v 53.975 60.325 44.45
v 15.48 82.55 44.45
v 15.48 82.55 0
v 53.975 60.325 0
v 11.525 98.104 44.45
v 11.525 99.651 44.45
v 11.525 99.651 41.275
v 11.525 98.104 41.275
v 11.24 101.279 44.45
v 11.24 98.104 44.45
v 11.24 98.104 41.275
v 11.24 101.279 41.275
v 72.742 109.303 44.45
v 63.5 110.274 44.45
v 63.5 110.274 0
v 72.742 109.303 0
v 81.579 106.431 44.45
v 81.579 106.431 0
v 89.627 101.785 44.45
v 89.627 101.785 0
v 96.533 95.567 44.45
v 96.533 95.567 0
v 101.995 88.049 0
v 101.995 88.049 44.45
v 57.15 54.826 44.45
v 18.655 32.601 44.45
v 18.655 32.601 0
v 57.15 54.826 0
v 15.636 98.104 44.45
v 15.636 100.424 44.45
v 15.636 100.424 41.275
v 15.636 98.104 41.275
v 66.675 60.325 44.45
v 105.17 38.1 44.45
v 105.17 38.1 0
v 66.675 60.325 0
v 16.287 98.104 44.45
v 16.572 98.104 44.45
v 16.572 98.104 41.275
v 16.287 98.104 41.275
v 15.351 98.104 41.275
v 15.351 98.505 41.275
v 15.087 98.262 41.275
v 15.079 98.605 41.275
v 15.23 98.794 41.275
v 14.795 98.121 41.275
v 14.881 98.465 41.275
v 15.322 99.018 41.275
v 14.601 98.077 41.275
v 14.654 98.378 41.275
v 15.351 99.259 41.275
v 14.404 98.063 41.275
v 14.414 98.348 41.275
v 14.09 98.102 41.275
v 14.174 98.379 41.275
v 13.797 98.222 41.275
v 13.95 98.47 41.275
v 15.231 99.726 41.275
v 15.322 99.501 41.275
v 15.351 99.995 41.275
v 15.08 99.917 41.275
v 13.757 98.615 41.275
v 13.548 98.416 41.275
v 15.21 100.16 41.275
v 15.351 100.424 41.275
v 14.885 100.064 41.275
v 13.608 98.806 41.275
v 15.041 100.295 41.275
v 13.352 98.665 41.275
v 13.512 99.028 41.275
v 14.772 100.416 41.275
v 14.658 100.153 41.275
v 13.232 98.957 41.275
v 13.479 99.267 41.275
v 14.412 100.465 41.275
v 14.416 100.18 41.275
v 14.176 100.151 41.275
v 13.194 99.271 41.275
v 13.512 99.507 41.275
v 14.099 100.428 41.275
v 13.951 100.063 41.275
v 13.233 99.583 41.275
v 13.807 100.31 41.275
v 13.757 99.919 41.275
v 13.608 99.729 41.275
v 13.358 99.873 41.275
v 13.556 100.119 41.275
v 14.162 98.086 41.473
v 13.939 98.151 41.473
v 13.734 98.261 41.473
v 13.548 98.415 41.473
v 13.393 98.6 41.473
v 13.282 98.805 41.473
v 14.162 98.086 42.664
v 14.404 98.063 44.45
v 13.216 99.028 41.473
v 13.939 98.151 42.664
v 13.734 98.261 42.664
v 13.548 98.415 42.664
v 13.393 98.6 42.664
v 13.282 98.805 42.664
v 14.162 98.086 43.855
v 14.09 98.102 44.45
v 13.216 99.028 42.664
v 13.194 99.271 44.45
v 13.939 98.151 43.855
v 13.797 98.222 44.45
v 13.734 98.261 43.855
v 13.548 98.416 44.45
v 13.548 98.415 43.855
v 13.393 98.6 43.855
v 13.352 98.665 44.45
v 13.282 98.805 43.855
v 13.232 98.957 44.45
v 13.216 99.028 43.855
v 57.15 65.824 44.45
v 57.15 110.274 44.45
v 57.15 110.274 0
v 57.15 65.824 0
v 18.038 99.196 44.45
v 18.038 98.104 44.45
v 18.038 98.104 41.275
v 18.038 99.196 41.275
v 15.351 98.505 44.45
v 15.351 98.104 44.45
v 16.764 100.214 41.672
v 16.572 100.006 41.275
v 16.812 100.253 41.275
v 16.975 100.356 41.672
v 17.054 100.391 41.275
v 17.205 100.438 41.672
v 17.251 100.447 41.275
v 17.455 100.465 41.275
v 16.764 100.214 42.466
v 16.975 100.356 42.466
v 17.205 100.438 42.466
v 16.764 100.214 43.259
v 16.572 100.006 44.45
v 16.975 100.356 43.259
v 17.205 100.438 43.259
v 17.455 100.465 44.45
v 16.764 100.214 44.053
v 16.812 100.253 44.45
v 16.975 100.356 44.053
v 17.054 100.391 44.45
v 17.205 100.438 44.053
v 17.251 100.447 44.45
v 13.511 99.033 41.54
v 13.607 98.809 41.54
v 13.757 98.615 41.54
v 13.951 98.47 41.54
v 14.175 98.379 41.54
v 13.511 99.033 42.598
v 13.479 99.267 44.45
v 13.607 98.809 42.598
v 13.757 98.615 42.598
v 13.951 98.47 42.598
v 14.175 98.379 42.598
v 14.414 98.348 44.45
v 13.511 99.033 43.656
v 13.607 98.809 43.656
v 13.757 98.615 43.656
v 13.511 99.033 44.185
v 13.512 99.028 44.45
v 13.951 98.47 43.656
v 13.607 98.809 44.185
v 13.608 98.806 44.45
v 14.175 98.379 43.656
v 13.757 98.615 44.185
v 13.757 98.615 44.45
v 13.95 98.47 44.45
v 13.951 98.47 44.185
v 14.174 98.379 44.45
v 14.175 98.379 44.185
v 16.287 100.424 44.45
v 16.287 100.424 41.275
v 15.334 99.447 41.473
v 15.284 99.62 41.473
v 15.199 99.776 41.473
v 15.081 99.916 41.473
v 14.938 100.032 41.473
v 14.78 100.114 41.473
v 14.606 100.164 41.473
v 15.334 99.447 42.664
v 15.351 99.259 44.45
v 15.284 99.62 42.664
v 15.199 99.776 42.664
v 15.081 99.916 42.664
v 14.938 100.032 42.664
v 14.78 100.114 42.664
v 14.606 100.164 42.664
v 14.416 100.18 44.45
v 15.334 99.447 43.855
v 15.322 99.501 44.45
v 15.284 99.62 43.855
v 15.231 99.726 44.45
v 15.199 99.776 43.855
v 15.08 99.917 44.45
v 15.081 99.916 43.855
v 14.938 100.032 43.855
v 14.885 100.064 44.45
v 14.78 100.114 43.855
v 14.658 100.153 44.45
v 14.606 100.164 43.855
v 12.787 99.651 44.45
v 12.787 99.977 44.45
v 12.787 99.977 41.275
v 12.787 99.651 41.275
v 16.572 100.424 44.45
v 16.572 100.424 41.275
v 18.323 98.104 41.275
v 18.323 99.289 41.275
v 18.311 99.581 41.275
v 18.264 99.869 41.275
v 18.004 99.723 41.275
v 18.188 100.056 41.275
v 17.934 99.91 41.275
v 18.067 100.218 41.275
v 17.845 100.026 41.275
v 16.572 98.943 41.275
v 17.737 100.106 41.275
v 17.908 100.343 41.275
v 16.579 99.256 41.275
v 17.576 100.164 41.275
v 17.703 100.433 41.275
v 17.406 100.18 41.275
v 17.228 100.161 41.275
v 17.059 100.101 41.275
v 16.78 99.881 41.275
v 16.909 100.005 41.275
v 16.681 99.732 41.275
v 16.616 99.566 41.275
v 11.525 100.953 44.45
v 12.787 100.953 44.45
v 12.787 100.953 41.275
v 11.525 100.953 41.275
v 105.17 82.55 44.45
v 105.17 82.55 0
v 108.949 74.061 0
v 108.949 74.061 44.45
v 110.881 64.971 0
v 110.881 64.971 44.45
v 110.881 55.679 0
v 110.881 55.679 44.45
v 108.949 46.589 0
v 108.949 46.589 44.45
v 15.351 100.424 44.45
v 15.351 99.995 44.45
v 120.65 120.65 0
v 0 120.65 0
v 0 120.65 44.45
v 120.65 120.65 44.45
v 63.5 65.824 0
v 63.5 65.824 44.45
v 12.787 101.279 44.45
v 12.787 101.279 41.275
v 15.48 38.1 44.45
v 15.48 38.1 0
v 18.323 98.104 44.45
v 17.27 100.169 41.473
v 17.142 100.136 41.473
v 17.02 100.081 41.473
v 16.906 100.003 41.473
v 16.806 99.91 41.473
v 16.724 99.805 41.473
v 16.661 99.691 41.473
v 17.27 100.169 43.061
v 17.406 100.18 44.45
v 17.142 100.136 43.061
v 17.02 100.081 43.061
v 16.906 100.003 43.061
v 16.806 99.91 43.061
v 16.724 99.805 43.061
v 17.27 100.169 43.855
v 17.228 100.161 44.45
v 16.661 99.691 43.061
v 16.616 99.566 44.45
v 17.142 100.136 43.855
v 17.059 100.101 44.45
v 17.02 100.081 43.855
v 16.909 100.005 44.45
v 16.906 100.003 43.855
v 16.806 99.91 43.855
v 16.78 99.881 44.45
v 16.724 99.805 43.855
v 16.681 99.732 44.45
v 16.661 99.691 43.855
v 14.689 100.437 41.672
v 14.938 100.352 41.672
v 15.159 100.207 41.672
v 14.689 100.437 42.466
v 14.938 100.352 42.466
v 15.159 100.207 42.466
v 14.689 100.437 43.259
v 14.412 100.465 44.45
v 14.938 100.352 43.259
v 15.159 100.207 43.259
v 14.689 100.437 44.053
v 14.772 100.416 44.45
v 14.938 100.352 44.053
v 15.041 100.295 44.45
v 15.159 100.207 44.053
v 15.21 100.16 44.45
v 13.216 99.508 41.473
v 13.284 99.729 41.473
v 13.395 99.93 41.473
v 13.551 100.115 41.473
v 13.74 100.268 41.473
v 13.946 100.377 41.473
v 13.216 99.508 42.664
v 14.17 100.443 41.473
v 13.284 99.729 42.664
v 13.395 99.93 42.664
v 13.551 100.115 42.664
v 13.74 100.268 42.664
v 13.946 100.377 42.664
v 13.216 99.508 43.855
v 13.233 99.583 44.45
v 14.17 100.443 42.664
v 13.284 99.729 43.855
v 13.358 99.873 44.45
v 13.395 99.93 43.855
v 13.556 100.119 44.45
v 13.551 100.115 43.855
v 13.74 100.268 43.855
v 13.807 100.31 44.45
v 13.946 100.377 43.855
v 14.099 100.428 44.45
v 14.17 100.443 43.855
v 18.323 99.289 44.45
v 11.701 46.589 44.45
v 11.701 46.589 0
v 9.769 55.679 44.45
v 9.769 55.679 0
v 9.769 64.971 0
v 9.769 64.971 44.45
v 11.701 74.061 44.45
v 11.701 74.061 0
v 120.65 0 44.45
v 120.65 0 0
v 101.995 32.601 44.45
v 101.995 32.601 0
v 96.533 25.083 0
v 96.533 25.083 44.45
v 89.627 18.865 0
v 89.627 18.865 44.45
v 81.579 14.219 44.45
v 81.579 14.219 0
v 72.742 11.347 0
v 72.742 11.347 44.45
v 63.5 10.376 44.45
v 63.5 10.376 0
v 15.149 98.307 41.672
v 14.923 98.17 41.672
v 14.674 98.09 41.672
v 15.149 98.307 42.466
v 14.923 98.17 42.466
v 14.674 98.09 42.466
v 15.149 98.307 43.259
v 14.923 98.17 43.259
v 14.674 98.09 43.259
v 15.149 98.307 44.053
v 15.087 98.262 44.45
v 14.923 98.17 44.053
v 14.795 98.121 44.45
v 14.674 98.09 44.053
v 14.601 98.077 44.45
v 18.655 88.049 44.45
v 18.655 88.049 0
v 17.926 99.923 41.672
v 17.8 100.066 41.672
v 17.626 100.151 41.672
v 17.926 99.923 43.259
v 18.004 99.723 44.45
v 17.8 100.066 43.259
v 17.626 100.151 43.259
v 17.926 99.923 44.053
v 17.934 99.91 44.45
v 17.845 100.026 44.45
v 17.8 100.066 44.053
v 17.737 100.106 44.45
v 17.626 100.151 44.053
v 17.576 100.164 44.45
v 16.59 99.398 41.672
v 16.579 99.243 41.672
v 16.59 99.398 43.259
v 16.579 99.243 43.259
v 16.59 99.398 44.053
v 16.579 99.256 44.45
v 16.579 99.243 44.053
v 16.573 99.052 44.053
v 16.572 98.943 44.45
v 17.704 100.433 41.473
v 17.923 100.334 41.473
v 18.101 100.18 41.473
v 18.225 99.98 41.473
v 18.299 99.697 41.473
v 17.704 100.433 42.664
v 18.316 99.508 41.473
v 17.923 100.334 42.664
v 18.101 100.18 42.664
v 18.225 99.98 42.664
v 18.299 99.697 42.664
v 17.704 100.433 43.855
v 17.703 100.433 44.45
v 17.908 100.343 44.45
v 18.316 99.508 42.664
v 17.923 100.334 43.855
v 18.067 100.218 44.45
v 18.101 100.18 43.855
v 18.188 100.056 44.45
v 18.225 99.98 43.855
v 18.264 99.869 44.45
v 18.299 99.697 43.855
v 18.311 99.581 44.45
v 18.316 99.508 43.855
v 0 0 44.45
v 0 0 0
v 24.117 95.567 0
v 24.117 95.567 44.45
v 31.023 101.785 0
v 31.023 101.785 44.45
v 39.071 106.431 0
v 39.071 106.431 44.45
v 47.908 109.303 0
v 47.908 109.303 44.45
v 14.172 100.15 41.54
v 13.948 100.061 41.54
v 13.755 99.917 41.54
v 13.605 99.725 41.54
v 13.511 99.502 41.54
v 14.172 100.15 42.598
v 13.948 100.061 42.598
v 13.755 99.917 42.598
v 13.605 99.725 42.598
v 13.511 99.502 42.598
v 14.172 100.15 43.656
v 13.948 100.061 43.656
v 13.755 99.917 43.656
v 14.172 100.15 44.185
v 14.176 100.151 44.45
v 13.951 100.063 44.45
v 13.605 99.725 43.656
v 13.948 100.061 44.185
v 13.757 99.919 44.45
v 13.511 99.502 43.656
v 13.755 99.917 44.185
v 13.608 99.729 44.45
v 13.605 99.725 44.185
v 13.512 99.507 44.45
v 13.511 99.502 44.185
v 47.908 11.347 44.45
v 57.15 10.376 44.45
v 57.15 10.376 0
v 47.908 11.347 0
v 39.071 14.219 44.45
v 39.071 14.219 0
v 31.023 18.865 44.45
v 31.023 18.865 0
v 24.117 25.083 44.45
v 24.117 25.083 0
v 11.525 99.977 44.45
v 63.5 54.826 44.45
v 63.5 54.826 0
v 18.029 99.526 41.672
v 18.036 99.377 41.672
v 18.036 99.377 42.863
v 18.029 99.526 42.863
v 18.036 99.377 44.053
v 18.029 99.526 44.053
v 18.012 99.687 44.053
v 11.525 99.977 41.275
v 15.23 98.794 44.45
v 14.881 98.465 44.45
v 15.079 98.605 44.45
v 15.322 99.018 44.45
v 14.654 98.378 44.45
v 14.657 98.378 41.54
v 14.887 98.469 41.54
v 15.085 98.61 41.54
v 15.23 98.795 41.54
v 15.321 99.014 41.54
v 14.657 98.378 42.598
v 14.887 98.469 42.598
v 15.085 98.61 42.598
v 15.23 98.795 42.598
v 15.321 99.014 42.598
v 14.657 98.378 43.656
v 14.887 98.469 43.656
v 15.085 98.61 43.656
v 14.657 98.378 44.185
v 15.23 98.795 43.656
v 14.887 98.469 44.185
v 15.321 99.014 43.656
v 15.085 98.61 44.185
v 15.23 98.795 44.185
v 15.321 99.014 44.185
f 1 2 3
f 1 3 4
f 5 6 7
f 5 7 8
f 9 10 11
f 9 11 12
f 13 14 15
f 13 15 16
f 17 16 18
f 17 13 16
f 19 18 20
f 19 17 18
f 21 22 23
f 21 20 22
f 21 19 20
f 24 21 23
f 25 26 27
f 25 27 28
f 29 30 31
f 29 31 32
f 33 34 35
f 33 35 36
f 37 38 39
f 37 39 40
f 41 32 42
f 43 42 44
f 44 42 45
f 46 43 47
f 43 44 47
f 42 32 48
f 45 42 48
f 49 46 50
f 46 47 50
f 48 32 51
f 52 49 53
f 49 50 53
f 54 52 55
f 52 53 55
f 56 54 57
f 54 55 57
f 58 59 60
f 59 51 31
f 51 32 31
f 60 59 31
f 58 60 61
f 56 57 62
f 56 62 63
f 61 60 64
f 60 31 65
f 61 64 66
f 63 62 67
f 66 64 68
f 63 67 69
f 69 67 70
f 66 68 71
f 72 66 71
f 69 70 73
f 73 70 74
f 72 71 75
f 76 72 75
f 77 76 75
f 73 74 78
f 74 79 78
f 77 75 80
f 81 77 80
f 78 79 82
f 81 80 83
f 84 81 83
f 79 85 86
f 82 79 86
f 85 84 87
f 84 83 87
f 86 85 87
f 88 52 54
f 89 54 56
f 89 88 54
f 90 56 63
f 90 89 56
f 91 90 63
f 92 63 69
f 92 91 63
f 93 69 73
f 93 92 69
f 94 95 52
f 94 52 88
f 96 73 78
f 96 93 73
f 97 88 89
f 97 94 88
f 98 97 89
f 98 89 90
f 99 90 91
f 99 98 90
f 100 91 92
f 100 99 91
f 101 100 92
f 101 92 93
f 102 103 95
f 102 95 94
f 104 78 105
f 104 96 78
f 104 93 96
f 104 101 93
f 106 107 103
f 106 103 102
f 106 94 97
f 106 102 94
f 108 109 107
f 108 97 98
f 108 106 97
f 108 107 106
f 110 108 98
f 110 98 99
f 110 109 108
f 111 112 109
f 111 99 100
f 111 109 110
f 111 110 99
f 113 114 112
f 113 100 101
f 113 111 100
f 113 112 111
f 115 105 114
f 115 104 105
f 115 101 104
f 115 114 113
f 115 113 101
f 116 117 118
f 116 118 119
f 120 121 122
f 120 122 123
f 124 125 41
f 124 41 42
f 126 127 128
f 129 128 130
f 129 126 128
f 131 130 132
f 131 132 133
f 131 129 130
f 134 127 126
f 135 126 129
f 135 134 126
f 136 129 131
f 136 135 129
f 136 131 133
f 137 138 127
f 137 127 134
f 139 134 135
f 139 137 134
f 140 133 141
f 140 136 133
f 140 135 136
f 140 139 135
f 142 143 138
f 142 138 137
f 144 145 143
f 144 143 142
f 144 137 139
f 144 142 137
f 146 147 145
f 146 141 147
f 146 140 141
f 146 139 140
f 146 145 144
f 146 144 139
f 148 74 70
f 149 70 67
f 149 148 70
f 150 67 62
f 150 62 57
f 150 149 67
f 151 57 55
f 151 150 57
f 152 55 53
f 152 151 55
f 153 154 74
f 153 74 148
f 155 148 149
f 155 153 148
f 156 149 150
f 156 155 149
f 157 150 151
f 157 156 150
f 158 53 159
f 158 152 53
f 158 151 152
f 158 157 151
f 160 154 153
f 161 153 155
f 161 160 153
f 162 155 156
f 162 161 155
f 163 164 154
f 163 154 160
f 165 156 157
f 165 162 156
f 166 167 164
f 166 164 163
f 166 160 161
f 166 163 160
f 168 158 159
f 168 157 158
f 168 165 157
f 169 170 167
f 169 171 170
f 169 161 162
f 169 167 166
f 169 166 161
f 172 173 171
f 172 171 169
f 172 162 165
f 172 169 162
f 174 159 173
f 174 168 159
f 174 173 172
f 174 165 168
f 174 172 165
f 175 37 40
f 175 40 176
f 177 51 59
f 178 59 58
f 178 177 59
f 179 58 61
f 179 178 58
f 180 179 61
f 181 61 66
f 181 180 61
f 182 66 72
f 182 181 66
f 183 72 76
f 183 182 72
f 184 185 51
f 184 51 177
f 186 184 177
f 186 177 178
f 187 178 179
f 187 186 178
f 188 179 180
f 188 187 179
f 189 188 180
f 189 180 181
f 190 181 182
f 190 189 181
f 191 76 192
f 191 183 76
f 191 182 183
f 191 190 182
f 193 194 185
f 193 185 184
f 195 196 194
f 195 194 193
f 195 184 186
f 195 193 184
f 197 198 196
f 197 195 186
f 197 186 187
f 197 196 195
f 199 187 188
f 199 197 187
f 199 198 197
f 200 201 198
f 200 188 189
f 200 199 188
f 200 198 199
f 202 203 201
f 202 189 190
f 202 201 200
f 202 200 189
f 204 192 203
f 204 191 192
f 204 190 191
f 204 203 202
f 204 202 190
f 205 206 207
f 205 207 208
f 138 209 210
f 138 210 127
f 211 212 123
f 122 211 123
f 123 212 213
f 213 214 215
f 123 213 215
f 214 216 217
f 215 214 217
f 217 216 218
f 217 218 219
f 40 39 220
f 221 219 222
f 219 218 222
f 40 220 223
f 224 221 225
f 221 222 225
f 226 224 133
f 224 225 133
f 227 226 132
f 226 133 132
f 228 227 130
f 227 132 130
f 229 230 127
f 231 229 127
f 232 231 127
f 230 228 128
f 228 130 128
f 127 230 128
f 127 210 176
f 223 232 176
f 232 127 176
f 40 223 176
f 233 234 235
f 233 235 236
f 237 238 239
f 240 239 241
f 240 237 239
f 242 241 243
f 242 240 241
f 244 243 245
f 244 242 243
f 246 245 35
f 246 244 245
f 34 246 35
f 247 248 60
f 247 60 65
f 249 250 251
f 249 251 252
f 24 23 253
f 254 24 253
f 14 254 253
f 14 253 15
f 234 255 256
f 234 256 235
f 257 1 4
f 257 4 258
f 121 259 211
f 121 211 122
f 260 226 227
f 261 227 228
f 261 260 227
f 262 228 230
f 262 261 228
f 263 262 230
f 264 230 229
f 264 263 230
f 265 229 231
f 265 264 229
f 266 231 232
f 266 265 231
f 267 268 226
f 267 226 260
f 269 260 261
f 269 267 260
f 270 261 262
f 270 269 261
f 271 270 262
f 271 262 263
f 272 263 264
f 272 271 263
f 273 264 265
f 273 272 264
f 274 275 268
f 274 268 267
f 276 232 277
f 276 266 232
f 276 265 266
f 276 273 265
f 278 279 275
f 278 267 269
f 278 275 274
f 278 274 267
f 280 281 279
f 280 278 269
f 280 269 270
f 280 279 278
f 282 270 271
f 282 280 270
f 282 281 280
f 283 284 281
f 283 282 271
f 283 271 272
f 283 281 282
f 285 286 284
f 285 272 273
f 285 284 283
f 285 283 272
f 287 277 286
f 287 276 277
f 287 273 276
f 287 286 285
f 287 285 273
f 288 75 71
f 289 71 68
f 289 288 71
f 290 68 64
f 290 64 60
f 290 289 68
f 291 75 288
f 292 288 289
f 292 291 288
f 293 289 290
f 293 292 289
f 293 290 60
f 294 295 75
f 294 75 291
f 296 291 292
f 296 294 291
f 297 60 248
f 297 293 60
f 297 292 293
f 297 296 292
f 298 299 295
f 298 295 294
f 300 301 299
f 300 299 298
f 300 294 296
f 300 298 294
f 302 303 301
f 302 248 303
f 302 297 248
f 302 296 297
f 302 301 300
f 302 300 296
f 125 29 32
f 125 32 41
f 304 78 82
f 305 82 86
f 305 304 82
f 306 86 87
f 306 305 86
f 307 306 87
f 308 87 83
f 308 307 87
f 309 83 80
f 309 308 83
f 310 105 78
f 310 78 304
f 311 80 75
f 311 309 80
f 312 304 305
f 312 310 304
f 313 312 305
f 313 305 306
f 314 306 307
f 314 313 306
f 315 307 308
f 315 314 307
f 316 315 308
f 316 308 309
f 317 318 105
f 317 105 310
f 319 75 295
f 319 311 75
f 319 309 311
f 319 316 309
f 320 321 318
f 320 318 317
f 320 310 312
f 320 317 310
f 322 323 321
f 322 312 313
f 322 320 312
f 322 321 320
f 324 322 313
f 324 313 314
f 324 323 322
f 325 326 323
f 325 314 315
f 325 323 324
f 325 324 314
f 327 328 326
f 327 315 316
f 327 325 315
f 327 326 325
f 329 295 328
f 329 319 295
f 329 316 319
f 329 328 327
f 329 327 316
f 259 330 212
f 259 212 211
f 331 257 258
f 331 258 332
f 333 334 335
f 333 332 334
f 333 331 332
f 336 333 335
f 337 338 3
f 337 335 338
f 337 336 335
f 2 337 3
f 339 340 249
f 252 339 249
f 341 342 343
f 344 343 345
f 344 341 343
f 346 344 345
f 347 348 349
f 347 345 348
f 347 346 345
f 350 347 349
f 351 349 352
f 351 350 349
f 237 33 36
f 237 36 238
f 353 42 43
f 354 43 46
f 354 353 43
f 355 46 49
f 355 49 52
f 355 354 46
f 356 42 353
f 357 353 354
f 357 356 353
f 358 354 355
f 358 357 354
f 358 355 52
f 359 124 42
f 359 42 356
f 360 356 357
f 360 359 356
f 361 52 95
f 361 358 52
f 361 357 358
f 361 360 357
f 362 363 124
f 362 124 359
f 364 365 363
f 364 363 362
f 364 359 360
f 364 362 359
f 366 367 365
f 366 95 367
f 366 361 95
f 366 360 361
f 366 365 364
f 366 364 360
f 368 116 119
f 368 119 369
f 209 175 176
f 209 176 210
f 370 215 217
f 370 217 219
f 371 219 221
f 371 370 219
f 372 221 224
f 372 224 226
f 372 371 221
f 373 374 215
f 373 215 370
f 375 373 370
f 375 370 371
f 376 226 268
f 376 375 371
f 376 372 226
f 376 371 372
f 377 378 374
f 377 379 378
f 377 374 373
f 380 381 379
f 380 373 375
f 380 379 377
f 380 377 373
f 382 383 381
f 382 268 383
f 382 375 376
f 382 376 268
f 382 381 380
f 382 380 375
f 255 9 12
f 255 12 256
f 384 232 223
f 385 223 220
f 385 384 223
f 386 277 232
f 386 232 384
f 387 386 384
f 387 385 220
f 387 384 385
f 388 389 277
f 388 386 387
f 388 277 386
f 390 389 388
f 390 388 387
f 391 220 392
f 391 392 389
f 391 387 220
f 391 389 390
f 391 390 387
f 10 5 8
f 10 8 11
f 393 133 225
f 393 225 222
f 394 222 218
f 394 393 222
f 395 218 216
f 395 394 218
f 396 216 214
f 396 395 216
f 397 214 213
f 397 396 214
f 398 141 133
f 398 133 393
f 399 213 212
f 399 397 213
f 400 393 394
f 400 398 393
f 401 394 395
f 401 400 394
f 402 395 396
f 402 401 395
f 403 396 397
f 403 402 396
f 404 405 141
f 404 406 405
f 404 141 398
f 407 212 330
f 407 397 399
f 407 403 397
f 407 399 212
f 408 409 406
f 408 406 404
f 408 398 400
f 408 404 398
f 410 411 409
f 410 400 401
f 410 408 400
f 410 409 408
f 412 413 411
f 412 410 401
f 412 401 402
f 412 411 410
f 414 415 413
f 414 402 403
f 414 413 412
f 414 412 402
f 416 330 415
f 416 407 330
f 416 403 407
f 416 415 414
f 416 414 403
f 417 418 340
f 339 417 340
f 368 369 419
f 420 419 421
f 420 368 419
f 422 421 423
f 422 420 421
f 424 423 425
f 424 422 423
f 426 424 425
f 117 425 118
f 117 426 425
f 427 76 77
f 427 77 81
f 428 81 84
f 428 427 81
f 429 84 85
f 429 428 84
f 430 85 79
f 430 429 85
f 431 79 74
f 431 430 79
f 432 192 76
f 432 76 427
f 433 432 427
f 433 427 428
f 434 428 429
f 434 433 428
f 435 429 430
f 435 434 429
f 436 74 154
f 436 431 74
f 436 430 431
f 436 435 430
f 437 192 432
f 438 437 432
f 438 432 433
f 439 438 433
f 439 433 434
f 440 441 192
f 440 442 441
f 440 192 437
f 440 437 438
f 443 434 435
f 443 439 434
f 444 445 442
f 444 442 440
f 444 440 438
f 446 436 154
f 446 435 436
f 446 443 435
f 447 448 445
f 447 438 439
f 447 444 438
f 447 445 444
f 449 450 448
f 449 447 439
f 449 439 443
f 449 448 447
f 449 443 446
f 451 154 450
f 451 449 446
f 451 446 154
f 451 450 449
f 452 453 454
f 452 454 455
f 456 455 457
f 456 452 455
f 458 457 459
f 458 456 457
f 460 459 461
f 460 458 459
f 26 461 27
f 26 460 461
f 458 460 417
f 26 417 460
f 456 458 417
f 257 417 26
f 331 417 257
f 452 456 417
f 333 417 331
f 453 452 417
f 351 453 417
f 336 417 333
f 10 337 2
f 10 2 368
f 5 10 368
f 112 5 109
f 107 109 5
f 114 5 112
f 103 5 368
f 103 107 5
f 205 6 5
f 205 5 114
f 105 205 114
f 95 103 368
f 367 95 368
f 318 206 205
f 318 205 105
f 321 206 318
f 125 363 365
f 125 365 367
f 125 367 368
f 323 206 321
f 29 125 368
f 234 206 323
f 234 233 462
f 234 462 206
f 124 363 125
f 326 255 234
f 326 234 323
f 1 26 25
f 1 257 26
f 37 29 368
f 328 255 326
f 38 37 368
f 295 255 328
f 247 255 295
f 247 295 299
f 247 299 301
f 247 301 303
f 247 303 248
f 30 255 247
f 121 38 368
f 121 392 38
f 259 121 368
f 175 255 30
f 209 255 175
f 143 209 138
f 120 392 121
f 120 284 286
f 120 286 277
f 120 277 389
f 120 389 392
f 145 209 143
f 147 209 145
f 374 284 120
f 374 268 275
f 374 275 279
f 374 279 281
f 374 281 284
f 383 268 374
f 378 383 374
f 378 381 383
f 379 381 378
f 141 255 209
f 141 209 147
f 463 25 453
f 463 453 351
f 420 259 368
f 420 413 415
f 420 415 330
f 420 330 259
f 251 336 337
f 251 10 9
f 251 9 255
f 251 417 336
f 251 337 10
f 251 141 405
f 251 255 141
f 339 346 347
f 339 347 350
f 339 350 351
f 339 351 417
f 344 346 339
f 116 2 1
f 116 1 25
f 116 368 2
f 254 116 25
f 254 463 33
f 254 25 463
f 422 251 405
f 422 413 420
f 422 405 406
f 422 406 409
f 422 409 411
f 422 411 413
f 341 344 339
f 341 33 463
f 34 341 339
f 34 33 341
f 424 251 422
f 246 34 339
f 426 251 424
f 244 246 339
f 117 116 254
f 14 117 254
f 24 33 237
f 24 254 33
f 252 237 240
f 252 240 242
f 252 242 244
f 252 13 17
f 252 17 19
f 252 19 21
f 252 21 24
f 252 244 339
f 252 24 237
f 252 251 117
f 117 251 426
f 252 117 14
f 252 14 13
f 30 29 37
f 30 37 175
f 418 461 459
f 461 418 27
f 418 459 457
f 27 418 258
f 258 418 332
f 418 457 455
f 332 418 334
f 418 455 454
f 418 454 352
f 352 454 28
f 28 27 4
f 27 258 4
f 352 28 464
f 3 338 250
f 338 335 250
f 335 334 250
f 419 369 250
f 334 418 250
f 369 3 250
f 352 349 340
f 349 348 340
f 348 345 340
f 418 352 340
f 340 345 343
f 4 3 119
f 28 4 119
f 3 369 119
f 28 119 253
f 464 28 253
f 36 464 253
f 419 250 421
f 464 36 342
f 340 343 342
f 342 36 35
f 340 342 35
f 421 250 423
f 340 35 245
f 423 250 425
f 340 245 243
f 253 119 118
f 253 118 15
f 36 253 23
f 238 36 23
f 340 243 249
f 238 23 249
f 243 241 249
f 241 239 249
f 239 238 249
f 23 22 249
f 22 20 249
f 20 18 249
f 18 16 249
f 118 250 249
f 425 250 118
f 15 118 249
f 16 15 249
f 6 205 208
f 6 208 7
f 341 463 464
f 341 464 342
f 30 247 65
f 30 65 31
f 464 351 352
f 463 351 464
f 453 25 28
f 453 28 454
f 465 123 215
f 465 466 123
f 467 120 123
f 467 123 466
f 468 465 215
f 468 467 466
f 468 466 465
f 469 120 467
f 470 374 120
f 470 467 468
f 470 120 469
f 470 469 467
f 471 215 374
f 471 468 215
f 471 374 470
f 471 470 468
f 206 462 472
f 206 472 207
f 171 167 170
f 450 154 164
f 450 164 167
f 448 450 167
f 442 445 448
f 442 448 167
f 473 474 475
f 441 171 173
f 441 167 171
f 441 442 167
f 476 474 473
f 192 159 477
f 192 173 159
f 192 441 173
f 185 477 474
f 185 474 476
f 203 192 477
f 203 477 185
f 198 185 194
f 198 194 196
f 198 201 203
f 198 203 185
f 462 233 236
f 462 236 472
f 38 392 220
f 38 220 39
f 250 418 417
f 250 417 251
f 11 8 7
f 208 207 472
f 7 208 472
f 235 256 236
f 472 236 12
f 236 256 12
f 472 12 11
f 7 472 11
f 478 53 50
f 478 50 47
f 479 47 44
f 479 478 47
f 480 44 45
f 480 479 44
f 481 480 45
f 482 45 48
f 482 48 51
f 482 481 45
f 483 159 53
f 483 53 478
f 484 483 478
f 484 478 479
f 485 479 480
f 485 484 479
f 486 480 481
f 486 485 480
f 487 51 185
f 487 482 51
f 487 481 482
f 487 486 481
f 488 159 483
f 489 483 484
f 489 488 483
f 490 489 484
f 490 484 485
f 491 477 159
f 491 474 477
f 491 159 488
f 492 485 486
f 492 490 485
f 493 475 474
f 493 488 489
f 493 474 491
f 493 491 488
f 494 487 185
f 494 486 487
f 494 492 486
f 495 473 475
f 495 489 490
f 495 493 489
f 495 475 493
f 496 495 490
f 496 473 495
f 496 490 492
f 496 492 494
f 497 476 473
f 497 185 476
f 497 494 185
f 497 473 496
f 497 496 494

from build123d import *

# Parameters (mm, degrees)
SKETCH1_W           = 120.65
SKETCH1_H           = 120.65
BOSS_EXTRUDE1_DEPTH = 44.45
CUT_EXTRUDE1_DEPTH  = 3.175
CUT_EXTRUDE2_DEPTH  = 177.319731024


with BuildPart() as part:
    # Sketch1 → Boss-Extrude1 (new body)
    with BuildSketch(Plane.XY):
        with Locations((60.325, 60.325)):
            Rectangle(SKETCH1_W, SKETCH1_H)
    extrude(amount=BOSS_EXTRUDE1_DEPTH)

    # Sketch2 → Cut-Extrude1 (cut)
    # profile 1 of 3: a face of its own
    with BuildSketch(Plane.XY.offset(44.45)):
        Polygon((11.239986737, 101.279136985), (12.786781609, 101.279136985), (12.786781609, 100.953495959), (11.524922635, 100.953495959), (11.524922635, 99.976572882), (12.786781609, 99.976572882), (12.786781609, 99.650931857), (11.524922635, 99.650931857), (11.524922635, 98.104136985), (11.239986737, 98.104136985), align=None)
    # profile 2 of 3: a face of its own
    with BuildSketch(Plane.XY.offset(44.45)):
        with BuildLine():
            Line((15.636140583, 100.424329293), (15.636140583, 98.104136985))
            Line((15.636140583, 98.104136985), (15.351204686, 98.104136985))
            Line((15.351204686, 98.104136985), (15.351204686, 98.505464108))
            add(Edge.make_bspline(
                [(15.351204686, 98.505464108), (15.319074783, 98.469142477), (15.256372873, 98.398260356), (15.151651288, 98.305657242), (15.040645869, 98.22911405), (14.923895385, 98.167292341), (14.801505264, 98.120853833), (14.673746814, 98.087846389), (14.540567918, 98.066624838), (14.449624711, 98.064505733), (14.40353842, 98.063431857)],
                knots=[0, 0, 0, 0, 1.074387032, 2.096679803, 3.090159297, 4.057316773, 5.018401886, 5.985159533, 6.978961417, 8, 8, 8, 8], degree=3))
            add(Edge.make_bspline(
                [(14.40353842, 98.063431857), (14.362564633, 98.064544352), (14.281762512, 98.066738241), (14.16290042, 98.08375833), (14.048516737, 98.111091109), (13.938503374, 98.149101201), (13.833572214, 98.199520947), (13.732824841, 98.259883364), (13.636783184, 98.331766117), (13.546911145, 98.4139424), (13.464150688, 98.50320071), (13.391523676, 98.598401313), (13.330969097, 98.699132546), (13.280332309, 98.80411905), (13.241328482, 98.914169013), (13.214138114, 99.028901872), (13.197137852, 99.148181972), (13.19494487, 99.229407111), (13.193832891, 99.270593315)],
                knots=[0, 0, 0, 0, 1.033919861, 2.038935746, 3.024066025, 3.998881131, 4.97069526, 5.957263378, 6.95902576, 7.993208707, 9.027059324, 10.027763471, 11.009749337, 11.988697705, 12.965288445, 13.950418724, 14.960734635, 16, 16, 16, 16], degree=3))
            add(Edge.make_bspline(
                [(13.193832891, 99.270593315), (13.194969515, 99.310928246), (13.19721656, 99.390668229), (13.213956266, 99.507942476), (13.242105824, 99.620898327), (13.281609943, 99.729172126), (13.332266573, 99.832894886), (13.393887052, 99.932139965), (13.46647583, 100.027180776), (13.550161942, 100.115782532), (13.640817055, 100.197625518), (13.737798546, 100.268753723), (13.838693952, 100.330182579), (13.945068254, 100.378853947), (14.055346985, 100.418232206), (14.170511896, 100.445476398), (14.290083828, 100.461530397), (14.371264489, 100.46385519), (14.412442667, 100.465034421)],
                knots=[0, 0, 0, 0, 1.020392517, 2.01726096, 2.990465484, 3.961182959, 4.928053699, 5.906110375, 6.912531644, 7.948652711, 8.985773172, 9.998621852, 10.987621588, 11.969261332, 12.953316658, 13.946091881, 14.958173133, 16, 16, 16, 16], degree=3))
            add(Edge.make_bspline(
                [(14.412442667, 100.465034421), (14.459795396, 100.463730175), (14.552651863, 100.46117261), (14.688476557, 100.439888564), (14.816968334, 100.403930812), (14.939119067, 100.355019939), (15.054490118, 100.290024306), (15.161989254, 100.20803677), (15.262741514, 100.109574407), (15.321143636, 100.033945504), (15.351204686, 99.995017394)],
                knots=[0, 0, 0, 0, 1.038897134, 2.037228247, 3.008116434, 3.962042015, 4.918381754, 5.904844433, 6.921570401, 8, 8, 8, 8], degree=3))
            Line((15.351204686, 99.995017394), (15.351204686, 100.424329293))
            Line((15.351204686, 100.424329293), (15.636140583, 100.424329293))
        make_face()
        with BuildLine():
            add(Edge.make_bspline(
                [(14.416258772, 100.180098523), (14.374607909, 100.178616581), (14.292395729, 100.175691461), (14.171705813, 100.152855505), (14.056214359, 100.114860194), (13.946498991, 100.062897327), (13.844292823, 99.997556973), (13.752949279, 99.918525432), (13.671721257, 99.827958998), (13.603405903, 99.726266369), (13.547715952, 99.617247672), (13.508557288, 99.503288361), (13.482731613, 99.386443845), (13.480093169, 99.307193409), (13.478768789, 99.267413227)],
                knots=[0, 0, 0, 0, 1.031046209, 2.035121221, 3.029706178, 4.034933723, 5.034054252, 6.02443088, 7.017295772, 8.038157696, 9.050218397, 10.03989886, 11.016116709, 12, 12, 12, 12], degree=3))
            add(Edge.make_bspline(
                [(13.478768789, 99.267413227), (13.480460513, 99.227870773), (13.483837331, 99.148940857), (13.508104033, 99.031937048), (13.548816489, 98.917950881), (13.604371789, 98.807949837), (13.673937513, 98.705819975), (13.754572219, 98.613527149), (13.847055689, 98.534161594), (13.94949707, 98.467724652), (14.058905729, 98.414055794), (14.173962224, 98.376712678), (14.292503696, 98.352602834), (14.373105456, 98.34978663), (14.413714702, 98.348367754)],
                knots=[0, 0, 0, 0, 0.979072187, 1.954306742, 2.945804271, 3.96968567, 4.997920485, 5.998718438, 6.996577872, 8.005894225, 9.015743152, 10.005417472, 10.995077863, 12, 12, 12, 12], degree=3))
            add(Edge.make_bspline(
                [(14.413714702, 98.348367754), (14.454941172, 98.349873579), (14.536936533, 98.352868514), (14.657984504, 98.375802233), (14.775454934, 98.4136925), (14.887747634, 98.46621528), (14.992355839, 98.531309452), (15.086243199, 98.607515885), (15.165632685, 98.696146631), (15.232935981, 98.793552413), (15.285709394, 98.90033401), (15.324150534, 99.014030026), (15.346878006, 99.134644419), (15.349742517, 99.217070981), (15.351204686, 99.259144998)],
                knots=[0, 0, 0, 0, 1.01762866, 2.023962475, 3.030623092, 4.058876274, 5.077231937, 6.066672613, 7.034107872, 8.005628644, 8.981990164, 9.965428785, 10.961468474, 12, 12, 12, 12], degree=3))
            add(Edge.make_bspline(
                [(15.351204686, 99.259144998), (15.350334141, 99.291201458), (15.348620632, 99.354298717), (15.335530044, 99.446942965), (15.314706646, 99.535601417), (15.285364049, 99.620367285), (15.246818384, 99.700771906), (15.200329339, 99.777392602), (15.145079395, 99.849830873), (15.08195795, 99.91708923), (15.01286523, 99.978436092), (14.939754468, 100.033195082), (14.861759462, 100.078179183), (14.780191864, 100.115409479), (14.694910154, 100.145035994), (14.605220377, 100.164800545), (14.512075868, 100.178371693), (14.448534089, 100.179516853), (14.416258772, 100.180098523)],
                knots=[0, 0, 0, 0, 1.050140795, 2.067009409, 3.05949893, 4.030605086, 5.00011959, 5.97591094, 6.962425594, 7.979863591, 8.993523472, 9.986985069, 10.967611495, 11.937549037, 12.921786183, 13.919465291, 14.943216303, 16, 16, 16, 16], degree=3))
        make_face(mode=Mode.SUBTRACT)
    # profile 3 of 3: a face of its own
    with BuildSketch(Plane.XY.offset(44.45)):
        with BuildLine():
            Line((16.287422635, 100.424329293), (16.572358532, 100.424329293))
            Line((16.572358532, 100.424329293), (16.572358532, 100.005829693))
            add(Edge.make_bspline(
                [(16.572358532, 100.005829693), (16.602781958, 100.04378702), (16.661819678, 100.117444538), (16.760139752, 100.214255345), (16.864047433, 100.294034228), (16.972906393, 100.357628384), (17.08686441, 100.405567823), (17.20522684, 100.440189775), (17.328702324, 100.460949584), (17.412671491, 100.46366215), (17.455151, 100.465034421)],
                knots=[0, 0, 0, 0, 1.12780773, 2.188550248, 3.19190651, 4.159438251, 5.104880172, 6.052711206, 7.014878035, 8, 8, 8, 8], degree=3))
            add(Edge.make_bspline(
                [(17.455151, 100.465034421), (17.498086647, 100.463451279), (17.582122064, 100.460352689), (17.704475734, 100.435844691), (17.818751598, 100.393984352), (17.924542195, 100.336641974), (18.019907596, 100.265334673), (18.103659425, 100.182260543), (18.1729318, 100.086705667), (18.219375122, 99.998056804), (18.249969102, 99.919417684), (18.269229866, 99.852065275), (18.285586542, 99.777028095), (18.29976677, 99.694532896), (18.309361722, 99.60400168), (18.316929372, 99.50580556), (18.322352902, 99.399976341), (18.322568082, 99.326782044), (18.322679045, 99.289037826)],
                knots=[0, 0, 0, 0, 1.235846778, 2.418850247, 3.575807741, 4.728682307, 5.871620074, 6.994088408, 8.11269785, 9.256955736, 9.865816715, 10.540099792, 11.271859618, 12.076849838, 12.949306005, 13.892391288, 14.913166135, 16, 16, 16, 16], degree=3))
            Line((18.322679045, 99.289037826), (18.322679045, 98.104136985))
            Line((18.322679045, 98.104136985), (18.037743147, 98.104136985))
            Line((18.037743147, 98.104136985), (18.037743147, 99.195543235))
            add(Edge.make_bspline(
                [(18.037743147, 99.195543235), (18.03756788, 99.227132167), (18.037232624, 99.287556418), (18.036175216, 99.374069747), (18.03362632, 99.452525428), (18.030044636, 99.522735897), (18.02480223, 99.584633735), (18.019338843, 99.638345007), (18.012657756, 99.683801521), (18.006704257, 99.71116556), (18.004034213, 99.723437866)],
                knots=[0, 0, 0, 0, 1.430800155, 2.736877192, 3.918605307, 4.986035426, 5.920637409, 6.731861385, 7.431261377, 8, 8, 8, 8], degree=3))
            add(Edge.make_bspline(
                [(18.004034213, 99.723437866), (17.994395338, 99.759461584), (17.975843486, 99.828796095), (17.930001944, 99.922843544), (17.872113366, 100.0028519), (17.801448888, 100.068326497), (17.718691084, 100.119281471), (17.624069604, 100.154636415), (17.518497552, 100.176749174), (17.444243933, 100.178950929), (17.405541625, 100.180098523)],
                knots=[0, 0, 0, 0, 1.084156227, 2.086665306, 3.027808233, 3.945421172, 4.874247719, 5.839848303, 6.874090471, 8, 8, 8, 8], degree=3))
            add(Edge.make_bspline(
                [(17.405541625, 100.180098523), (17.382620226, 100.179666719), (17.337259371, 100.17881219), (17.269994753, 100.170238512), (17.204749253, 100.156215485), (17.140868064, 100.137284649), (17.079628851, 100.111283876), (17.019064101, 100.081775091), (16.961454393, 100.04499207), (16.905571312, 100.00399772), (16.853580408, 99.958568725), (16.805203986, 99.910631205), (16.762080211, 99.859581193), (16.72301077, 99.806241241), (16.689284774, 99.749878788), (16.659845187, 99.691037595), (16.634866378, 99.629640218), (16.622454221, 99.587027126), (16.616243748, 99.565705495)],
                knots=[0, 0, 0, 0, 1.023777757, 2.026029729, 3.023749952, 4.003683103, 4.997618607, 5.993177895, 7.010360494, 8.046726602, 9.087585522, 10.09234134, 11.086953743, 12.070360549, 13.043493632, 14.017870808, 15.008233677, 16, 16, 16, 16], degree=3))
            add(Edge.make_bspline(
                [(16.616243748, 99.565705495), (16.612669924, 99.55005256), (16.604889896, 99.515976941), (16.596486869, 99.460056647), (16.588859997, 99.395368312), (16.58247647, 99.321987425), (16.578570842, 99.239657066), (16.574312354, 99.148728842), (16.572761991, 99.048840178), (16.572496784, 98.979297071), (16.572358532, 98.943044237)],
                knots=[0, 0, 0, 0, 0.615963638, 1.340920617, 2.168419149, 3.115676021, 4.16674242, 5.331190069, 6.6087489, 8, 8, 8, 8], degree=3))
            Line((16.572358532, 98.943044237), (16.572358532, 98.104136985))
            Line((16.572358532, 98.104136985), (16.287422635, 98.104136985))
            Line((16.287422635, 98.104136985), (16.287422635, 100.424329293))
        make_face()
    extrude(amount=-CUT_EXTRUDE1_DEPTH, mode=Mode.SUBTRACT)

    # Sketch3 → Cut-Extrude2 (cut, through all)
    with BuildSketch(Plane.XY.offset(44.45)):
        with BuildLine():
            Line((66.675, 60.325), (105.169829198, 82.55))
            ThreePointArc((105.169829198, 82.55), (111.125, 60.325), (105.169829198, 38.1))
            Line((105.169829198, 38.1), (66.675, 60.325))
        make_face()
        with BuildLine():
            Line((63.5, 54.825738686), (101.994829198, 32.600738686))
            ThreePointArc((101.994829198, 32.600738686), (85.725, 16.330909488), (63.5, 10.375738686))
            Line((63.5, 10.375738686), (63.5, 54.825738686))
        make_face()
        with BuildLine():
            Line((57.15, 54.825738686), (57.15, 10.375738686))
            ThreePointArc((57.15, 10.375738686), (34.925, 16.330909488), (18.655170802, 32.600738686))
            Line((18.655170802, 32.600738686), (57.15, 54.825738686))
        make_face()
        with BuildLine():
            Line((53.975, 60.325), (15.480170802, 38.1))
            ThreePointArc((15.480170802, 38.1), (9.525, 60.325), (15.480170802, 82.55))
            Line((15.480170802, 82.55), (53.975, 60.325))
        make_face()
        with BuildLine():
            Line((57.15, 65.824261314), (18.655170802, 88.049261314))
            ThreePointArc((18.655170802, 88.049261314), (34.925, 104.319090512), (57.15, 110.274261314))
            Line((57.15, 110.274261314), (57.15, 65.824261314))
        make_face()
        with BuildLine():
            Line((63.5, 65.824261314), (63.5, 110.274261314))
            ThreePointArc((63.5, 110.274261314), (85.725, 104.319090512), (101.994829198, 88.049261314))
            Line((101.994829198, 88.049261314), (63.5, 65.824261314))
        make_face()
    extrude(amount=-CUT_EXTRUDE2_DEPTH, mode=Mode.SUBTRACT)


solid = part.part
